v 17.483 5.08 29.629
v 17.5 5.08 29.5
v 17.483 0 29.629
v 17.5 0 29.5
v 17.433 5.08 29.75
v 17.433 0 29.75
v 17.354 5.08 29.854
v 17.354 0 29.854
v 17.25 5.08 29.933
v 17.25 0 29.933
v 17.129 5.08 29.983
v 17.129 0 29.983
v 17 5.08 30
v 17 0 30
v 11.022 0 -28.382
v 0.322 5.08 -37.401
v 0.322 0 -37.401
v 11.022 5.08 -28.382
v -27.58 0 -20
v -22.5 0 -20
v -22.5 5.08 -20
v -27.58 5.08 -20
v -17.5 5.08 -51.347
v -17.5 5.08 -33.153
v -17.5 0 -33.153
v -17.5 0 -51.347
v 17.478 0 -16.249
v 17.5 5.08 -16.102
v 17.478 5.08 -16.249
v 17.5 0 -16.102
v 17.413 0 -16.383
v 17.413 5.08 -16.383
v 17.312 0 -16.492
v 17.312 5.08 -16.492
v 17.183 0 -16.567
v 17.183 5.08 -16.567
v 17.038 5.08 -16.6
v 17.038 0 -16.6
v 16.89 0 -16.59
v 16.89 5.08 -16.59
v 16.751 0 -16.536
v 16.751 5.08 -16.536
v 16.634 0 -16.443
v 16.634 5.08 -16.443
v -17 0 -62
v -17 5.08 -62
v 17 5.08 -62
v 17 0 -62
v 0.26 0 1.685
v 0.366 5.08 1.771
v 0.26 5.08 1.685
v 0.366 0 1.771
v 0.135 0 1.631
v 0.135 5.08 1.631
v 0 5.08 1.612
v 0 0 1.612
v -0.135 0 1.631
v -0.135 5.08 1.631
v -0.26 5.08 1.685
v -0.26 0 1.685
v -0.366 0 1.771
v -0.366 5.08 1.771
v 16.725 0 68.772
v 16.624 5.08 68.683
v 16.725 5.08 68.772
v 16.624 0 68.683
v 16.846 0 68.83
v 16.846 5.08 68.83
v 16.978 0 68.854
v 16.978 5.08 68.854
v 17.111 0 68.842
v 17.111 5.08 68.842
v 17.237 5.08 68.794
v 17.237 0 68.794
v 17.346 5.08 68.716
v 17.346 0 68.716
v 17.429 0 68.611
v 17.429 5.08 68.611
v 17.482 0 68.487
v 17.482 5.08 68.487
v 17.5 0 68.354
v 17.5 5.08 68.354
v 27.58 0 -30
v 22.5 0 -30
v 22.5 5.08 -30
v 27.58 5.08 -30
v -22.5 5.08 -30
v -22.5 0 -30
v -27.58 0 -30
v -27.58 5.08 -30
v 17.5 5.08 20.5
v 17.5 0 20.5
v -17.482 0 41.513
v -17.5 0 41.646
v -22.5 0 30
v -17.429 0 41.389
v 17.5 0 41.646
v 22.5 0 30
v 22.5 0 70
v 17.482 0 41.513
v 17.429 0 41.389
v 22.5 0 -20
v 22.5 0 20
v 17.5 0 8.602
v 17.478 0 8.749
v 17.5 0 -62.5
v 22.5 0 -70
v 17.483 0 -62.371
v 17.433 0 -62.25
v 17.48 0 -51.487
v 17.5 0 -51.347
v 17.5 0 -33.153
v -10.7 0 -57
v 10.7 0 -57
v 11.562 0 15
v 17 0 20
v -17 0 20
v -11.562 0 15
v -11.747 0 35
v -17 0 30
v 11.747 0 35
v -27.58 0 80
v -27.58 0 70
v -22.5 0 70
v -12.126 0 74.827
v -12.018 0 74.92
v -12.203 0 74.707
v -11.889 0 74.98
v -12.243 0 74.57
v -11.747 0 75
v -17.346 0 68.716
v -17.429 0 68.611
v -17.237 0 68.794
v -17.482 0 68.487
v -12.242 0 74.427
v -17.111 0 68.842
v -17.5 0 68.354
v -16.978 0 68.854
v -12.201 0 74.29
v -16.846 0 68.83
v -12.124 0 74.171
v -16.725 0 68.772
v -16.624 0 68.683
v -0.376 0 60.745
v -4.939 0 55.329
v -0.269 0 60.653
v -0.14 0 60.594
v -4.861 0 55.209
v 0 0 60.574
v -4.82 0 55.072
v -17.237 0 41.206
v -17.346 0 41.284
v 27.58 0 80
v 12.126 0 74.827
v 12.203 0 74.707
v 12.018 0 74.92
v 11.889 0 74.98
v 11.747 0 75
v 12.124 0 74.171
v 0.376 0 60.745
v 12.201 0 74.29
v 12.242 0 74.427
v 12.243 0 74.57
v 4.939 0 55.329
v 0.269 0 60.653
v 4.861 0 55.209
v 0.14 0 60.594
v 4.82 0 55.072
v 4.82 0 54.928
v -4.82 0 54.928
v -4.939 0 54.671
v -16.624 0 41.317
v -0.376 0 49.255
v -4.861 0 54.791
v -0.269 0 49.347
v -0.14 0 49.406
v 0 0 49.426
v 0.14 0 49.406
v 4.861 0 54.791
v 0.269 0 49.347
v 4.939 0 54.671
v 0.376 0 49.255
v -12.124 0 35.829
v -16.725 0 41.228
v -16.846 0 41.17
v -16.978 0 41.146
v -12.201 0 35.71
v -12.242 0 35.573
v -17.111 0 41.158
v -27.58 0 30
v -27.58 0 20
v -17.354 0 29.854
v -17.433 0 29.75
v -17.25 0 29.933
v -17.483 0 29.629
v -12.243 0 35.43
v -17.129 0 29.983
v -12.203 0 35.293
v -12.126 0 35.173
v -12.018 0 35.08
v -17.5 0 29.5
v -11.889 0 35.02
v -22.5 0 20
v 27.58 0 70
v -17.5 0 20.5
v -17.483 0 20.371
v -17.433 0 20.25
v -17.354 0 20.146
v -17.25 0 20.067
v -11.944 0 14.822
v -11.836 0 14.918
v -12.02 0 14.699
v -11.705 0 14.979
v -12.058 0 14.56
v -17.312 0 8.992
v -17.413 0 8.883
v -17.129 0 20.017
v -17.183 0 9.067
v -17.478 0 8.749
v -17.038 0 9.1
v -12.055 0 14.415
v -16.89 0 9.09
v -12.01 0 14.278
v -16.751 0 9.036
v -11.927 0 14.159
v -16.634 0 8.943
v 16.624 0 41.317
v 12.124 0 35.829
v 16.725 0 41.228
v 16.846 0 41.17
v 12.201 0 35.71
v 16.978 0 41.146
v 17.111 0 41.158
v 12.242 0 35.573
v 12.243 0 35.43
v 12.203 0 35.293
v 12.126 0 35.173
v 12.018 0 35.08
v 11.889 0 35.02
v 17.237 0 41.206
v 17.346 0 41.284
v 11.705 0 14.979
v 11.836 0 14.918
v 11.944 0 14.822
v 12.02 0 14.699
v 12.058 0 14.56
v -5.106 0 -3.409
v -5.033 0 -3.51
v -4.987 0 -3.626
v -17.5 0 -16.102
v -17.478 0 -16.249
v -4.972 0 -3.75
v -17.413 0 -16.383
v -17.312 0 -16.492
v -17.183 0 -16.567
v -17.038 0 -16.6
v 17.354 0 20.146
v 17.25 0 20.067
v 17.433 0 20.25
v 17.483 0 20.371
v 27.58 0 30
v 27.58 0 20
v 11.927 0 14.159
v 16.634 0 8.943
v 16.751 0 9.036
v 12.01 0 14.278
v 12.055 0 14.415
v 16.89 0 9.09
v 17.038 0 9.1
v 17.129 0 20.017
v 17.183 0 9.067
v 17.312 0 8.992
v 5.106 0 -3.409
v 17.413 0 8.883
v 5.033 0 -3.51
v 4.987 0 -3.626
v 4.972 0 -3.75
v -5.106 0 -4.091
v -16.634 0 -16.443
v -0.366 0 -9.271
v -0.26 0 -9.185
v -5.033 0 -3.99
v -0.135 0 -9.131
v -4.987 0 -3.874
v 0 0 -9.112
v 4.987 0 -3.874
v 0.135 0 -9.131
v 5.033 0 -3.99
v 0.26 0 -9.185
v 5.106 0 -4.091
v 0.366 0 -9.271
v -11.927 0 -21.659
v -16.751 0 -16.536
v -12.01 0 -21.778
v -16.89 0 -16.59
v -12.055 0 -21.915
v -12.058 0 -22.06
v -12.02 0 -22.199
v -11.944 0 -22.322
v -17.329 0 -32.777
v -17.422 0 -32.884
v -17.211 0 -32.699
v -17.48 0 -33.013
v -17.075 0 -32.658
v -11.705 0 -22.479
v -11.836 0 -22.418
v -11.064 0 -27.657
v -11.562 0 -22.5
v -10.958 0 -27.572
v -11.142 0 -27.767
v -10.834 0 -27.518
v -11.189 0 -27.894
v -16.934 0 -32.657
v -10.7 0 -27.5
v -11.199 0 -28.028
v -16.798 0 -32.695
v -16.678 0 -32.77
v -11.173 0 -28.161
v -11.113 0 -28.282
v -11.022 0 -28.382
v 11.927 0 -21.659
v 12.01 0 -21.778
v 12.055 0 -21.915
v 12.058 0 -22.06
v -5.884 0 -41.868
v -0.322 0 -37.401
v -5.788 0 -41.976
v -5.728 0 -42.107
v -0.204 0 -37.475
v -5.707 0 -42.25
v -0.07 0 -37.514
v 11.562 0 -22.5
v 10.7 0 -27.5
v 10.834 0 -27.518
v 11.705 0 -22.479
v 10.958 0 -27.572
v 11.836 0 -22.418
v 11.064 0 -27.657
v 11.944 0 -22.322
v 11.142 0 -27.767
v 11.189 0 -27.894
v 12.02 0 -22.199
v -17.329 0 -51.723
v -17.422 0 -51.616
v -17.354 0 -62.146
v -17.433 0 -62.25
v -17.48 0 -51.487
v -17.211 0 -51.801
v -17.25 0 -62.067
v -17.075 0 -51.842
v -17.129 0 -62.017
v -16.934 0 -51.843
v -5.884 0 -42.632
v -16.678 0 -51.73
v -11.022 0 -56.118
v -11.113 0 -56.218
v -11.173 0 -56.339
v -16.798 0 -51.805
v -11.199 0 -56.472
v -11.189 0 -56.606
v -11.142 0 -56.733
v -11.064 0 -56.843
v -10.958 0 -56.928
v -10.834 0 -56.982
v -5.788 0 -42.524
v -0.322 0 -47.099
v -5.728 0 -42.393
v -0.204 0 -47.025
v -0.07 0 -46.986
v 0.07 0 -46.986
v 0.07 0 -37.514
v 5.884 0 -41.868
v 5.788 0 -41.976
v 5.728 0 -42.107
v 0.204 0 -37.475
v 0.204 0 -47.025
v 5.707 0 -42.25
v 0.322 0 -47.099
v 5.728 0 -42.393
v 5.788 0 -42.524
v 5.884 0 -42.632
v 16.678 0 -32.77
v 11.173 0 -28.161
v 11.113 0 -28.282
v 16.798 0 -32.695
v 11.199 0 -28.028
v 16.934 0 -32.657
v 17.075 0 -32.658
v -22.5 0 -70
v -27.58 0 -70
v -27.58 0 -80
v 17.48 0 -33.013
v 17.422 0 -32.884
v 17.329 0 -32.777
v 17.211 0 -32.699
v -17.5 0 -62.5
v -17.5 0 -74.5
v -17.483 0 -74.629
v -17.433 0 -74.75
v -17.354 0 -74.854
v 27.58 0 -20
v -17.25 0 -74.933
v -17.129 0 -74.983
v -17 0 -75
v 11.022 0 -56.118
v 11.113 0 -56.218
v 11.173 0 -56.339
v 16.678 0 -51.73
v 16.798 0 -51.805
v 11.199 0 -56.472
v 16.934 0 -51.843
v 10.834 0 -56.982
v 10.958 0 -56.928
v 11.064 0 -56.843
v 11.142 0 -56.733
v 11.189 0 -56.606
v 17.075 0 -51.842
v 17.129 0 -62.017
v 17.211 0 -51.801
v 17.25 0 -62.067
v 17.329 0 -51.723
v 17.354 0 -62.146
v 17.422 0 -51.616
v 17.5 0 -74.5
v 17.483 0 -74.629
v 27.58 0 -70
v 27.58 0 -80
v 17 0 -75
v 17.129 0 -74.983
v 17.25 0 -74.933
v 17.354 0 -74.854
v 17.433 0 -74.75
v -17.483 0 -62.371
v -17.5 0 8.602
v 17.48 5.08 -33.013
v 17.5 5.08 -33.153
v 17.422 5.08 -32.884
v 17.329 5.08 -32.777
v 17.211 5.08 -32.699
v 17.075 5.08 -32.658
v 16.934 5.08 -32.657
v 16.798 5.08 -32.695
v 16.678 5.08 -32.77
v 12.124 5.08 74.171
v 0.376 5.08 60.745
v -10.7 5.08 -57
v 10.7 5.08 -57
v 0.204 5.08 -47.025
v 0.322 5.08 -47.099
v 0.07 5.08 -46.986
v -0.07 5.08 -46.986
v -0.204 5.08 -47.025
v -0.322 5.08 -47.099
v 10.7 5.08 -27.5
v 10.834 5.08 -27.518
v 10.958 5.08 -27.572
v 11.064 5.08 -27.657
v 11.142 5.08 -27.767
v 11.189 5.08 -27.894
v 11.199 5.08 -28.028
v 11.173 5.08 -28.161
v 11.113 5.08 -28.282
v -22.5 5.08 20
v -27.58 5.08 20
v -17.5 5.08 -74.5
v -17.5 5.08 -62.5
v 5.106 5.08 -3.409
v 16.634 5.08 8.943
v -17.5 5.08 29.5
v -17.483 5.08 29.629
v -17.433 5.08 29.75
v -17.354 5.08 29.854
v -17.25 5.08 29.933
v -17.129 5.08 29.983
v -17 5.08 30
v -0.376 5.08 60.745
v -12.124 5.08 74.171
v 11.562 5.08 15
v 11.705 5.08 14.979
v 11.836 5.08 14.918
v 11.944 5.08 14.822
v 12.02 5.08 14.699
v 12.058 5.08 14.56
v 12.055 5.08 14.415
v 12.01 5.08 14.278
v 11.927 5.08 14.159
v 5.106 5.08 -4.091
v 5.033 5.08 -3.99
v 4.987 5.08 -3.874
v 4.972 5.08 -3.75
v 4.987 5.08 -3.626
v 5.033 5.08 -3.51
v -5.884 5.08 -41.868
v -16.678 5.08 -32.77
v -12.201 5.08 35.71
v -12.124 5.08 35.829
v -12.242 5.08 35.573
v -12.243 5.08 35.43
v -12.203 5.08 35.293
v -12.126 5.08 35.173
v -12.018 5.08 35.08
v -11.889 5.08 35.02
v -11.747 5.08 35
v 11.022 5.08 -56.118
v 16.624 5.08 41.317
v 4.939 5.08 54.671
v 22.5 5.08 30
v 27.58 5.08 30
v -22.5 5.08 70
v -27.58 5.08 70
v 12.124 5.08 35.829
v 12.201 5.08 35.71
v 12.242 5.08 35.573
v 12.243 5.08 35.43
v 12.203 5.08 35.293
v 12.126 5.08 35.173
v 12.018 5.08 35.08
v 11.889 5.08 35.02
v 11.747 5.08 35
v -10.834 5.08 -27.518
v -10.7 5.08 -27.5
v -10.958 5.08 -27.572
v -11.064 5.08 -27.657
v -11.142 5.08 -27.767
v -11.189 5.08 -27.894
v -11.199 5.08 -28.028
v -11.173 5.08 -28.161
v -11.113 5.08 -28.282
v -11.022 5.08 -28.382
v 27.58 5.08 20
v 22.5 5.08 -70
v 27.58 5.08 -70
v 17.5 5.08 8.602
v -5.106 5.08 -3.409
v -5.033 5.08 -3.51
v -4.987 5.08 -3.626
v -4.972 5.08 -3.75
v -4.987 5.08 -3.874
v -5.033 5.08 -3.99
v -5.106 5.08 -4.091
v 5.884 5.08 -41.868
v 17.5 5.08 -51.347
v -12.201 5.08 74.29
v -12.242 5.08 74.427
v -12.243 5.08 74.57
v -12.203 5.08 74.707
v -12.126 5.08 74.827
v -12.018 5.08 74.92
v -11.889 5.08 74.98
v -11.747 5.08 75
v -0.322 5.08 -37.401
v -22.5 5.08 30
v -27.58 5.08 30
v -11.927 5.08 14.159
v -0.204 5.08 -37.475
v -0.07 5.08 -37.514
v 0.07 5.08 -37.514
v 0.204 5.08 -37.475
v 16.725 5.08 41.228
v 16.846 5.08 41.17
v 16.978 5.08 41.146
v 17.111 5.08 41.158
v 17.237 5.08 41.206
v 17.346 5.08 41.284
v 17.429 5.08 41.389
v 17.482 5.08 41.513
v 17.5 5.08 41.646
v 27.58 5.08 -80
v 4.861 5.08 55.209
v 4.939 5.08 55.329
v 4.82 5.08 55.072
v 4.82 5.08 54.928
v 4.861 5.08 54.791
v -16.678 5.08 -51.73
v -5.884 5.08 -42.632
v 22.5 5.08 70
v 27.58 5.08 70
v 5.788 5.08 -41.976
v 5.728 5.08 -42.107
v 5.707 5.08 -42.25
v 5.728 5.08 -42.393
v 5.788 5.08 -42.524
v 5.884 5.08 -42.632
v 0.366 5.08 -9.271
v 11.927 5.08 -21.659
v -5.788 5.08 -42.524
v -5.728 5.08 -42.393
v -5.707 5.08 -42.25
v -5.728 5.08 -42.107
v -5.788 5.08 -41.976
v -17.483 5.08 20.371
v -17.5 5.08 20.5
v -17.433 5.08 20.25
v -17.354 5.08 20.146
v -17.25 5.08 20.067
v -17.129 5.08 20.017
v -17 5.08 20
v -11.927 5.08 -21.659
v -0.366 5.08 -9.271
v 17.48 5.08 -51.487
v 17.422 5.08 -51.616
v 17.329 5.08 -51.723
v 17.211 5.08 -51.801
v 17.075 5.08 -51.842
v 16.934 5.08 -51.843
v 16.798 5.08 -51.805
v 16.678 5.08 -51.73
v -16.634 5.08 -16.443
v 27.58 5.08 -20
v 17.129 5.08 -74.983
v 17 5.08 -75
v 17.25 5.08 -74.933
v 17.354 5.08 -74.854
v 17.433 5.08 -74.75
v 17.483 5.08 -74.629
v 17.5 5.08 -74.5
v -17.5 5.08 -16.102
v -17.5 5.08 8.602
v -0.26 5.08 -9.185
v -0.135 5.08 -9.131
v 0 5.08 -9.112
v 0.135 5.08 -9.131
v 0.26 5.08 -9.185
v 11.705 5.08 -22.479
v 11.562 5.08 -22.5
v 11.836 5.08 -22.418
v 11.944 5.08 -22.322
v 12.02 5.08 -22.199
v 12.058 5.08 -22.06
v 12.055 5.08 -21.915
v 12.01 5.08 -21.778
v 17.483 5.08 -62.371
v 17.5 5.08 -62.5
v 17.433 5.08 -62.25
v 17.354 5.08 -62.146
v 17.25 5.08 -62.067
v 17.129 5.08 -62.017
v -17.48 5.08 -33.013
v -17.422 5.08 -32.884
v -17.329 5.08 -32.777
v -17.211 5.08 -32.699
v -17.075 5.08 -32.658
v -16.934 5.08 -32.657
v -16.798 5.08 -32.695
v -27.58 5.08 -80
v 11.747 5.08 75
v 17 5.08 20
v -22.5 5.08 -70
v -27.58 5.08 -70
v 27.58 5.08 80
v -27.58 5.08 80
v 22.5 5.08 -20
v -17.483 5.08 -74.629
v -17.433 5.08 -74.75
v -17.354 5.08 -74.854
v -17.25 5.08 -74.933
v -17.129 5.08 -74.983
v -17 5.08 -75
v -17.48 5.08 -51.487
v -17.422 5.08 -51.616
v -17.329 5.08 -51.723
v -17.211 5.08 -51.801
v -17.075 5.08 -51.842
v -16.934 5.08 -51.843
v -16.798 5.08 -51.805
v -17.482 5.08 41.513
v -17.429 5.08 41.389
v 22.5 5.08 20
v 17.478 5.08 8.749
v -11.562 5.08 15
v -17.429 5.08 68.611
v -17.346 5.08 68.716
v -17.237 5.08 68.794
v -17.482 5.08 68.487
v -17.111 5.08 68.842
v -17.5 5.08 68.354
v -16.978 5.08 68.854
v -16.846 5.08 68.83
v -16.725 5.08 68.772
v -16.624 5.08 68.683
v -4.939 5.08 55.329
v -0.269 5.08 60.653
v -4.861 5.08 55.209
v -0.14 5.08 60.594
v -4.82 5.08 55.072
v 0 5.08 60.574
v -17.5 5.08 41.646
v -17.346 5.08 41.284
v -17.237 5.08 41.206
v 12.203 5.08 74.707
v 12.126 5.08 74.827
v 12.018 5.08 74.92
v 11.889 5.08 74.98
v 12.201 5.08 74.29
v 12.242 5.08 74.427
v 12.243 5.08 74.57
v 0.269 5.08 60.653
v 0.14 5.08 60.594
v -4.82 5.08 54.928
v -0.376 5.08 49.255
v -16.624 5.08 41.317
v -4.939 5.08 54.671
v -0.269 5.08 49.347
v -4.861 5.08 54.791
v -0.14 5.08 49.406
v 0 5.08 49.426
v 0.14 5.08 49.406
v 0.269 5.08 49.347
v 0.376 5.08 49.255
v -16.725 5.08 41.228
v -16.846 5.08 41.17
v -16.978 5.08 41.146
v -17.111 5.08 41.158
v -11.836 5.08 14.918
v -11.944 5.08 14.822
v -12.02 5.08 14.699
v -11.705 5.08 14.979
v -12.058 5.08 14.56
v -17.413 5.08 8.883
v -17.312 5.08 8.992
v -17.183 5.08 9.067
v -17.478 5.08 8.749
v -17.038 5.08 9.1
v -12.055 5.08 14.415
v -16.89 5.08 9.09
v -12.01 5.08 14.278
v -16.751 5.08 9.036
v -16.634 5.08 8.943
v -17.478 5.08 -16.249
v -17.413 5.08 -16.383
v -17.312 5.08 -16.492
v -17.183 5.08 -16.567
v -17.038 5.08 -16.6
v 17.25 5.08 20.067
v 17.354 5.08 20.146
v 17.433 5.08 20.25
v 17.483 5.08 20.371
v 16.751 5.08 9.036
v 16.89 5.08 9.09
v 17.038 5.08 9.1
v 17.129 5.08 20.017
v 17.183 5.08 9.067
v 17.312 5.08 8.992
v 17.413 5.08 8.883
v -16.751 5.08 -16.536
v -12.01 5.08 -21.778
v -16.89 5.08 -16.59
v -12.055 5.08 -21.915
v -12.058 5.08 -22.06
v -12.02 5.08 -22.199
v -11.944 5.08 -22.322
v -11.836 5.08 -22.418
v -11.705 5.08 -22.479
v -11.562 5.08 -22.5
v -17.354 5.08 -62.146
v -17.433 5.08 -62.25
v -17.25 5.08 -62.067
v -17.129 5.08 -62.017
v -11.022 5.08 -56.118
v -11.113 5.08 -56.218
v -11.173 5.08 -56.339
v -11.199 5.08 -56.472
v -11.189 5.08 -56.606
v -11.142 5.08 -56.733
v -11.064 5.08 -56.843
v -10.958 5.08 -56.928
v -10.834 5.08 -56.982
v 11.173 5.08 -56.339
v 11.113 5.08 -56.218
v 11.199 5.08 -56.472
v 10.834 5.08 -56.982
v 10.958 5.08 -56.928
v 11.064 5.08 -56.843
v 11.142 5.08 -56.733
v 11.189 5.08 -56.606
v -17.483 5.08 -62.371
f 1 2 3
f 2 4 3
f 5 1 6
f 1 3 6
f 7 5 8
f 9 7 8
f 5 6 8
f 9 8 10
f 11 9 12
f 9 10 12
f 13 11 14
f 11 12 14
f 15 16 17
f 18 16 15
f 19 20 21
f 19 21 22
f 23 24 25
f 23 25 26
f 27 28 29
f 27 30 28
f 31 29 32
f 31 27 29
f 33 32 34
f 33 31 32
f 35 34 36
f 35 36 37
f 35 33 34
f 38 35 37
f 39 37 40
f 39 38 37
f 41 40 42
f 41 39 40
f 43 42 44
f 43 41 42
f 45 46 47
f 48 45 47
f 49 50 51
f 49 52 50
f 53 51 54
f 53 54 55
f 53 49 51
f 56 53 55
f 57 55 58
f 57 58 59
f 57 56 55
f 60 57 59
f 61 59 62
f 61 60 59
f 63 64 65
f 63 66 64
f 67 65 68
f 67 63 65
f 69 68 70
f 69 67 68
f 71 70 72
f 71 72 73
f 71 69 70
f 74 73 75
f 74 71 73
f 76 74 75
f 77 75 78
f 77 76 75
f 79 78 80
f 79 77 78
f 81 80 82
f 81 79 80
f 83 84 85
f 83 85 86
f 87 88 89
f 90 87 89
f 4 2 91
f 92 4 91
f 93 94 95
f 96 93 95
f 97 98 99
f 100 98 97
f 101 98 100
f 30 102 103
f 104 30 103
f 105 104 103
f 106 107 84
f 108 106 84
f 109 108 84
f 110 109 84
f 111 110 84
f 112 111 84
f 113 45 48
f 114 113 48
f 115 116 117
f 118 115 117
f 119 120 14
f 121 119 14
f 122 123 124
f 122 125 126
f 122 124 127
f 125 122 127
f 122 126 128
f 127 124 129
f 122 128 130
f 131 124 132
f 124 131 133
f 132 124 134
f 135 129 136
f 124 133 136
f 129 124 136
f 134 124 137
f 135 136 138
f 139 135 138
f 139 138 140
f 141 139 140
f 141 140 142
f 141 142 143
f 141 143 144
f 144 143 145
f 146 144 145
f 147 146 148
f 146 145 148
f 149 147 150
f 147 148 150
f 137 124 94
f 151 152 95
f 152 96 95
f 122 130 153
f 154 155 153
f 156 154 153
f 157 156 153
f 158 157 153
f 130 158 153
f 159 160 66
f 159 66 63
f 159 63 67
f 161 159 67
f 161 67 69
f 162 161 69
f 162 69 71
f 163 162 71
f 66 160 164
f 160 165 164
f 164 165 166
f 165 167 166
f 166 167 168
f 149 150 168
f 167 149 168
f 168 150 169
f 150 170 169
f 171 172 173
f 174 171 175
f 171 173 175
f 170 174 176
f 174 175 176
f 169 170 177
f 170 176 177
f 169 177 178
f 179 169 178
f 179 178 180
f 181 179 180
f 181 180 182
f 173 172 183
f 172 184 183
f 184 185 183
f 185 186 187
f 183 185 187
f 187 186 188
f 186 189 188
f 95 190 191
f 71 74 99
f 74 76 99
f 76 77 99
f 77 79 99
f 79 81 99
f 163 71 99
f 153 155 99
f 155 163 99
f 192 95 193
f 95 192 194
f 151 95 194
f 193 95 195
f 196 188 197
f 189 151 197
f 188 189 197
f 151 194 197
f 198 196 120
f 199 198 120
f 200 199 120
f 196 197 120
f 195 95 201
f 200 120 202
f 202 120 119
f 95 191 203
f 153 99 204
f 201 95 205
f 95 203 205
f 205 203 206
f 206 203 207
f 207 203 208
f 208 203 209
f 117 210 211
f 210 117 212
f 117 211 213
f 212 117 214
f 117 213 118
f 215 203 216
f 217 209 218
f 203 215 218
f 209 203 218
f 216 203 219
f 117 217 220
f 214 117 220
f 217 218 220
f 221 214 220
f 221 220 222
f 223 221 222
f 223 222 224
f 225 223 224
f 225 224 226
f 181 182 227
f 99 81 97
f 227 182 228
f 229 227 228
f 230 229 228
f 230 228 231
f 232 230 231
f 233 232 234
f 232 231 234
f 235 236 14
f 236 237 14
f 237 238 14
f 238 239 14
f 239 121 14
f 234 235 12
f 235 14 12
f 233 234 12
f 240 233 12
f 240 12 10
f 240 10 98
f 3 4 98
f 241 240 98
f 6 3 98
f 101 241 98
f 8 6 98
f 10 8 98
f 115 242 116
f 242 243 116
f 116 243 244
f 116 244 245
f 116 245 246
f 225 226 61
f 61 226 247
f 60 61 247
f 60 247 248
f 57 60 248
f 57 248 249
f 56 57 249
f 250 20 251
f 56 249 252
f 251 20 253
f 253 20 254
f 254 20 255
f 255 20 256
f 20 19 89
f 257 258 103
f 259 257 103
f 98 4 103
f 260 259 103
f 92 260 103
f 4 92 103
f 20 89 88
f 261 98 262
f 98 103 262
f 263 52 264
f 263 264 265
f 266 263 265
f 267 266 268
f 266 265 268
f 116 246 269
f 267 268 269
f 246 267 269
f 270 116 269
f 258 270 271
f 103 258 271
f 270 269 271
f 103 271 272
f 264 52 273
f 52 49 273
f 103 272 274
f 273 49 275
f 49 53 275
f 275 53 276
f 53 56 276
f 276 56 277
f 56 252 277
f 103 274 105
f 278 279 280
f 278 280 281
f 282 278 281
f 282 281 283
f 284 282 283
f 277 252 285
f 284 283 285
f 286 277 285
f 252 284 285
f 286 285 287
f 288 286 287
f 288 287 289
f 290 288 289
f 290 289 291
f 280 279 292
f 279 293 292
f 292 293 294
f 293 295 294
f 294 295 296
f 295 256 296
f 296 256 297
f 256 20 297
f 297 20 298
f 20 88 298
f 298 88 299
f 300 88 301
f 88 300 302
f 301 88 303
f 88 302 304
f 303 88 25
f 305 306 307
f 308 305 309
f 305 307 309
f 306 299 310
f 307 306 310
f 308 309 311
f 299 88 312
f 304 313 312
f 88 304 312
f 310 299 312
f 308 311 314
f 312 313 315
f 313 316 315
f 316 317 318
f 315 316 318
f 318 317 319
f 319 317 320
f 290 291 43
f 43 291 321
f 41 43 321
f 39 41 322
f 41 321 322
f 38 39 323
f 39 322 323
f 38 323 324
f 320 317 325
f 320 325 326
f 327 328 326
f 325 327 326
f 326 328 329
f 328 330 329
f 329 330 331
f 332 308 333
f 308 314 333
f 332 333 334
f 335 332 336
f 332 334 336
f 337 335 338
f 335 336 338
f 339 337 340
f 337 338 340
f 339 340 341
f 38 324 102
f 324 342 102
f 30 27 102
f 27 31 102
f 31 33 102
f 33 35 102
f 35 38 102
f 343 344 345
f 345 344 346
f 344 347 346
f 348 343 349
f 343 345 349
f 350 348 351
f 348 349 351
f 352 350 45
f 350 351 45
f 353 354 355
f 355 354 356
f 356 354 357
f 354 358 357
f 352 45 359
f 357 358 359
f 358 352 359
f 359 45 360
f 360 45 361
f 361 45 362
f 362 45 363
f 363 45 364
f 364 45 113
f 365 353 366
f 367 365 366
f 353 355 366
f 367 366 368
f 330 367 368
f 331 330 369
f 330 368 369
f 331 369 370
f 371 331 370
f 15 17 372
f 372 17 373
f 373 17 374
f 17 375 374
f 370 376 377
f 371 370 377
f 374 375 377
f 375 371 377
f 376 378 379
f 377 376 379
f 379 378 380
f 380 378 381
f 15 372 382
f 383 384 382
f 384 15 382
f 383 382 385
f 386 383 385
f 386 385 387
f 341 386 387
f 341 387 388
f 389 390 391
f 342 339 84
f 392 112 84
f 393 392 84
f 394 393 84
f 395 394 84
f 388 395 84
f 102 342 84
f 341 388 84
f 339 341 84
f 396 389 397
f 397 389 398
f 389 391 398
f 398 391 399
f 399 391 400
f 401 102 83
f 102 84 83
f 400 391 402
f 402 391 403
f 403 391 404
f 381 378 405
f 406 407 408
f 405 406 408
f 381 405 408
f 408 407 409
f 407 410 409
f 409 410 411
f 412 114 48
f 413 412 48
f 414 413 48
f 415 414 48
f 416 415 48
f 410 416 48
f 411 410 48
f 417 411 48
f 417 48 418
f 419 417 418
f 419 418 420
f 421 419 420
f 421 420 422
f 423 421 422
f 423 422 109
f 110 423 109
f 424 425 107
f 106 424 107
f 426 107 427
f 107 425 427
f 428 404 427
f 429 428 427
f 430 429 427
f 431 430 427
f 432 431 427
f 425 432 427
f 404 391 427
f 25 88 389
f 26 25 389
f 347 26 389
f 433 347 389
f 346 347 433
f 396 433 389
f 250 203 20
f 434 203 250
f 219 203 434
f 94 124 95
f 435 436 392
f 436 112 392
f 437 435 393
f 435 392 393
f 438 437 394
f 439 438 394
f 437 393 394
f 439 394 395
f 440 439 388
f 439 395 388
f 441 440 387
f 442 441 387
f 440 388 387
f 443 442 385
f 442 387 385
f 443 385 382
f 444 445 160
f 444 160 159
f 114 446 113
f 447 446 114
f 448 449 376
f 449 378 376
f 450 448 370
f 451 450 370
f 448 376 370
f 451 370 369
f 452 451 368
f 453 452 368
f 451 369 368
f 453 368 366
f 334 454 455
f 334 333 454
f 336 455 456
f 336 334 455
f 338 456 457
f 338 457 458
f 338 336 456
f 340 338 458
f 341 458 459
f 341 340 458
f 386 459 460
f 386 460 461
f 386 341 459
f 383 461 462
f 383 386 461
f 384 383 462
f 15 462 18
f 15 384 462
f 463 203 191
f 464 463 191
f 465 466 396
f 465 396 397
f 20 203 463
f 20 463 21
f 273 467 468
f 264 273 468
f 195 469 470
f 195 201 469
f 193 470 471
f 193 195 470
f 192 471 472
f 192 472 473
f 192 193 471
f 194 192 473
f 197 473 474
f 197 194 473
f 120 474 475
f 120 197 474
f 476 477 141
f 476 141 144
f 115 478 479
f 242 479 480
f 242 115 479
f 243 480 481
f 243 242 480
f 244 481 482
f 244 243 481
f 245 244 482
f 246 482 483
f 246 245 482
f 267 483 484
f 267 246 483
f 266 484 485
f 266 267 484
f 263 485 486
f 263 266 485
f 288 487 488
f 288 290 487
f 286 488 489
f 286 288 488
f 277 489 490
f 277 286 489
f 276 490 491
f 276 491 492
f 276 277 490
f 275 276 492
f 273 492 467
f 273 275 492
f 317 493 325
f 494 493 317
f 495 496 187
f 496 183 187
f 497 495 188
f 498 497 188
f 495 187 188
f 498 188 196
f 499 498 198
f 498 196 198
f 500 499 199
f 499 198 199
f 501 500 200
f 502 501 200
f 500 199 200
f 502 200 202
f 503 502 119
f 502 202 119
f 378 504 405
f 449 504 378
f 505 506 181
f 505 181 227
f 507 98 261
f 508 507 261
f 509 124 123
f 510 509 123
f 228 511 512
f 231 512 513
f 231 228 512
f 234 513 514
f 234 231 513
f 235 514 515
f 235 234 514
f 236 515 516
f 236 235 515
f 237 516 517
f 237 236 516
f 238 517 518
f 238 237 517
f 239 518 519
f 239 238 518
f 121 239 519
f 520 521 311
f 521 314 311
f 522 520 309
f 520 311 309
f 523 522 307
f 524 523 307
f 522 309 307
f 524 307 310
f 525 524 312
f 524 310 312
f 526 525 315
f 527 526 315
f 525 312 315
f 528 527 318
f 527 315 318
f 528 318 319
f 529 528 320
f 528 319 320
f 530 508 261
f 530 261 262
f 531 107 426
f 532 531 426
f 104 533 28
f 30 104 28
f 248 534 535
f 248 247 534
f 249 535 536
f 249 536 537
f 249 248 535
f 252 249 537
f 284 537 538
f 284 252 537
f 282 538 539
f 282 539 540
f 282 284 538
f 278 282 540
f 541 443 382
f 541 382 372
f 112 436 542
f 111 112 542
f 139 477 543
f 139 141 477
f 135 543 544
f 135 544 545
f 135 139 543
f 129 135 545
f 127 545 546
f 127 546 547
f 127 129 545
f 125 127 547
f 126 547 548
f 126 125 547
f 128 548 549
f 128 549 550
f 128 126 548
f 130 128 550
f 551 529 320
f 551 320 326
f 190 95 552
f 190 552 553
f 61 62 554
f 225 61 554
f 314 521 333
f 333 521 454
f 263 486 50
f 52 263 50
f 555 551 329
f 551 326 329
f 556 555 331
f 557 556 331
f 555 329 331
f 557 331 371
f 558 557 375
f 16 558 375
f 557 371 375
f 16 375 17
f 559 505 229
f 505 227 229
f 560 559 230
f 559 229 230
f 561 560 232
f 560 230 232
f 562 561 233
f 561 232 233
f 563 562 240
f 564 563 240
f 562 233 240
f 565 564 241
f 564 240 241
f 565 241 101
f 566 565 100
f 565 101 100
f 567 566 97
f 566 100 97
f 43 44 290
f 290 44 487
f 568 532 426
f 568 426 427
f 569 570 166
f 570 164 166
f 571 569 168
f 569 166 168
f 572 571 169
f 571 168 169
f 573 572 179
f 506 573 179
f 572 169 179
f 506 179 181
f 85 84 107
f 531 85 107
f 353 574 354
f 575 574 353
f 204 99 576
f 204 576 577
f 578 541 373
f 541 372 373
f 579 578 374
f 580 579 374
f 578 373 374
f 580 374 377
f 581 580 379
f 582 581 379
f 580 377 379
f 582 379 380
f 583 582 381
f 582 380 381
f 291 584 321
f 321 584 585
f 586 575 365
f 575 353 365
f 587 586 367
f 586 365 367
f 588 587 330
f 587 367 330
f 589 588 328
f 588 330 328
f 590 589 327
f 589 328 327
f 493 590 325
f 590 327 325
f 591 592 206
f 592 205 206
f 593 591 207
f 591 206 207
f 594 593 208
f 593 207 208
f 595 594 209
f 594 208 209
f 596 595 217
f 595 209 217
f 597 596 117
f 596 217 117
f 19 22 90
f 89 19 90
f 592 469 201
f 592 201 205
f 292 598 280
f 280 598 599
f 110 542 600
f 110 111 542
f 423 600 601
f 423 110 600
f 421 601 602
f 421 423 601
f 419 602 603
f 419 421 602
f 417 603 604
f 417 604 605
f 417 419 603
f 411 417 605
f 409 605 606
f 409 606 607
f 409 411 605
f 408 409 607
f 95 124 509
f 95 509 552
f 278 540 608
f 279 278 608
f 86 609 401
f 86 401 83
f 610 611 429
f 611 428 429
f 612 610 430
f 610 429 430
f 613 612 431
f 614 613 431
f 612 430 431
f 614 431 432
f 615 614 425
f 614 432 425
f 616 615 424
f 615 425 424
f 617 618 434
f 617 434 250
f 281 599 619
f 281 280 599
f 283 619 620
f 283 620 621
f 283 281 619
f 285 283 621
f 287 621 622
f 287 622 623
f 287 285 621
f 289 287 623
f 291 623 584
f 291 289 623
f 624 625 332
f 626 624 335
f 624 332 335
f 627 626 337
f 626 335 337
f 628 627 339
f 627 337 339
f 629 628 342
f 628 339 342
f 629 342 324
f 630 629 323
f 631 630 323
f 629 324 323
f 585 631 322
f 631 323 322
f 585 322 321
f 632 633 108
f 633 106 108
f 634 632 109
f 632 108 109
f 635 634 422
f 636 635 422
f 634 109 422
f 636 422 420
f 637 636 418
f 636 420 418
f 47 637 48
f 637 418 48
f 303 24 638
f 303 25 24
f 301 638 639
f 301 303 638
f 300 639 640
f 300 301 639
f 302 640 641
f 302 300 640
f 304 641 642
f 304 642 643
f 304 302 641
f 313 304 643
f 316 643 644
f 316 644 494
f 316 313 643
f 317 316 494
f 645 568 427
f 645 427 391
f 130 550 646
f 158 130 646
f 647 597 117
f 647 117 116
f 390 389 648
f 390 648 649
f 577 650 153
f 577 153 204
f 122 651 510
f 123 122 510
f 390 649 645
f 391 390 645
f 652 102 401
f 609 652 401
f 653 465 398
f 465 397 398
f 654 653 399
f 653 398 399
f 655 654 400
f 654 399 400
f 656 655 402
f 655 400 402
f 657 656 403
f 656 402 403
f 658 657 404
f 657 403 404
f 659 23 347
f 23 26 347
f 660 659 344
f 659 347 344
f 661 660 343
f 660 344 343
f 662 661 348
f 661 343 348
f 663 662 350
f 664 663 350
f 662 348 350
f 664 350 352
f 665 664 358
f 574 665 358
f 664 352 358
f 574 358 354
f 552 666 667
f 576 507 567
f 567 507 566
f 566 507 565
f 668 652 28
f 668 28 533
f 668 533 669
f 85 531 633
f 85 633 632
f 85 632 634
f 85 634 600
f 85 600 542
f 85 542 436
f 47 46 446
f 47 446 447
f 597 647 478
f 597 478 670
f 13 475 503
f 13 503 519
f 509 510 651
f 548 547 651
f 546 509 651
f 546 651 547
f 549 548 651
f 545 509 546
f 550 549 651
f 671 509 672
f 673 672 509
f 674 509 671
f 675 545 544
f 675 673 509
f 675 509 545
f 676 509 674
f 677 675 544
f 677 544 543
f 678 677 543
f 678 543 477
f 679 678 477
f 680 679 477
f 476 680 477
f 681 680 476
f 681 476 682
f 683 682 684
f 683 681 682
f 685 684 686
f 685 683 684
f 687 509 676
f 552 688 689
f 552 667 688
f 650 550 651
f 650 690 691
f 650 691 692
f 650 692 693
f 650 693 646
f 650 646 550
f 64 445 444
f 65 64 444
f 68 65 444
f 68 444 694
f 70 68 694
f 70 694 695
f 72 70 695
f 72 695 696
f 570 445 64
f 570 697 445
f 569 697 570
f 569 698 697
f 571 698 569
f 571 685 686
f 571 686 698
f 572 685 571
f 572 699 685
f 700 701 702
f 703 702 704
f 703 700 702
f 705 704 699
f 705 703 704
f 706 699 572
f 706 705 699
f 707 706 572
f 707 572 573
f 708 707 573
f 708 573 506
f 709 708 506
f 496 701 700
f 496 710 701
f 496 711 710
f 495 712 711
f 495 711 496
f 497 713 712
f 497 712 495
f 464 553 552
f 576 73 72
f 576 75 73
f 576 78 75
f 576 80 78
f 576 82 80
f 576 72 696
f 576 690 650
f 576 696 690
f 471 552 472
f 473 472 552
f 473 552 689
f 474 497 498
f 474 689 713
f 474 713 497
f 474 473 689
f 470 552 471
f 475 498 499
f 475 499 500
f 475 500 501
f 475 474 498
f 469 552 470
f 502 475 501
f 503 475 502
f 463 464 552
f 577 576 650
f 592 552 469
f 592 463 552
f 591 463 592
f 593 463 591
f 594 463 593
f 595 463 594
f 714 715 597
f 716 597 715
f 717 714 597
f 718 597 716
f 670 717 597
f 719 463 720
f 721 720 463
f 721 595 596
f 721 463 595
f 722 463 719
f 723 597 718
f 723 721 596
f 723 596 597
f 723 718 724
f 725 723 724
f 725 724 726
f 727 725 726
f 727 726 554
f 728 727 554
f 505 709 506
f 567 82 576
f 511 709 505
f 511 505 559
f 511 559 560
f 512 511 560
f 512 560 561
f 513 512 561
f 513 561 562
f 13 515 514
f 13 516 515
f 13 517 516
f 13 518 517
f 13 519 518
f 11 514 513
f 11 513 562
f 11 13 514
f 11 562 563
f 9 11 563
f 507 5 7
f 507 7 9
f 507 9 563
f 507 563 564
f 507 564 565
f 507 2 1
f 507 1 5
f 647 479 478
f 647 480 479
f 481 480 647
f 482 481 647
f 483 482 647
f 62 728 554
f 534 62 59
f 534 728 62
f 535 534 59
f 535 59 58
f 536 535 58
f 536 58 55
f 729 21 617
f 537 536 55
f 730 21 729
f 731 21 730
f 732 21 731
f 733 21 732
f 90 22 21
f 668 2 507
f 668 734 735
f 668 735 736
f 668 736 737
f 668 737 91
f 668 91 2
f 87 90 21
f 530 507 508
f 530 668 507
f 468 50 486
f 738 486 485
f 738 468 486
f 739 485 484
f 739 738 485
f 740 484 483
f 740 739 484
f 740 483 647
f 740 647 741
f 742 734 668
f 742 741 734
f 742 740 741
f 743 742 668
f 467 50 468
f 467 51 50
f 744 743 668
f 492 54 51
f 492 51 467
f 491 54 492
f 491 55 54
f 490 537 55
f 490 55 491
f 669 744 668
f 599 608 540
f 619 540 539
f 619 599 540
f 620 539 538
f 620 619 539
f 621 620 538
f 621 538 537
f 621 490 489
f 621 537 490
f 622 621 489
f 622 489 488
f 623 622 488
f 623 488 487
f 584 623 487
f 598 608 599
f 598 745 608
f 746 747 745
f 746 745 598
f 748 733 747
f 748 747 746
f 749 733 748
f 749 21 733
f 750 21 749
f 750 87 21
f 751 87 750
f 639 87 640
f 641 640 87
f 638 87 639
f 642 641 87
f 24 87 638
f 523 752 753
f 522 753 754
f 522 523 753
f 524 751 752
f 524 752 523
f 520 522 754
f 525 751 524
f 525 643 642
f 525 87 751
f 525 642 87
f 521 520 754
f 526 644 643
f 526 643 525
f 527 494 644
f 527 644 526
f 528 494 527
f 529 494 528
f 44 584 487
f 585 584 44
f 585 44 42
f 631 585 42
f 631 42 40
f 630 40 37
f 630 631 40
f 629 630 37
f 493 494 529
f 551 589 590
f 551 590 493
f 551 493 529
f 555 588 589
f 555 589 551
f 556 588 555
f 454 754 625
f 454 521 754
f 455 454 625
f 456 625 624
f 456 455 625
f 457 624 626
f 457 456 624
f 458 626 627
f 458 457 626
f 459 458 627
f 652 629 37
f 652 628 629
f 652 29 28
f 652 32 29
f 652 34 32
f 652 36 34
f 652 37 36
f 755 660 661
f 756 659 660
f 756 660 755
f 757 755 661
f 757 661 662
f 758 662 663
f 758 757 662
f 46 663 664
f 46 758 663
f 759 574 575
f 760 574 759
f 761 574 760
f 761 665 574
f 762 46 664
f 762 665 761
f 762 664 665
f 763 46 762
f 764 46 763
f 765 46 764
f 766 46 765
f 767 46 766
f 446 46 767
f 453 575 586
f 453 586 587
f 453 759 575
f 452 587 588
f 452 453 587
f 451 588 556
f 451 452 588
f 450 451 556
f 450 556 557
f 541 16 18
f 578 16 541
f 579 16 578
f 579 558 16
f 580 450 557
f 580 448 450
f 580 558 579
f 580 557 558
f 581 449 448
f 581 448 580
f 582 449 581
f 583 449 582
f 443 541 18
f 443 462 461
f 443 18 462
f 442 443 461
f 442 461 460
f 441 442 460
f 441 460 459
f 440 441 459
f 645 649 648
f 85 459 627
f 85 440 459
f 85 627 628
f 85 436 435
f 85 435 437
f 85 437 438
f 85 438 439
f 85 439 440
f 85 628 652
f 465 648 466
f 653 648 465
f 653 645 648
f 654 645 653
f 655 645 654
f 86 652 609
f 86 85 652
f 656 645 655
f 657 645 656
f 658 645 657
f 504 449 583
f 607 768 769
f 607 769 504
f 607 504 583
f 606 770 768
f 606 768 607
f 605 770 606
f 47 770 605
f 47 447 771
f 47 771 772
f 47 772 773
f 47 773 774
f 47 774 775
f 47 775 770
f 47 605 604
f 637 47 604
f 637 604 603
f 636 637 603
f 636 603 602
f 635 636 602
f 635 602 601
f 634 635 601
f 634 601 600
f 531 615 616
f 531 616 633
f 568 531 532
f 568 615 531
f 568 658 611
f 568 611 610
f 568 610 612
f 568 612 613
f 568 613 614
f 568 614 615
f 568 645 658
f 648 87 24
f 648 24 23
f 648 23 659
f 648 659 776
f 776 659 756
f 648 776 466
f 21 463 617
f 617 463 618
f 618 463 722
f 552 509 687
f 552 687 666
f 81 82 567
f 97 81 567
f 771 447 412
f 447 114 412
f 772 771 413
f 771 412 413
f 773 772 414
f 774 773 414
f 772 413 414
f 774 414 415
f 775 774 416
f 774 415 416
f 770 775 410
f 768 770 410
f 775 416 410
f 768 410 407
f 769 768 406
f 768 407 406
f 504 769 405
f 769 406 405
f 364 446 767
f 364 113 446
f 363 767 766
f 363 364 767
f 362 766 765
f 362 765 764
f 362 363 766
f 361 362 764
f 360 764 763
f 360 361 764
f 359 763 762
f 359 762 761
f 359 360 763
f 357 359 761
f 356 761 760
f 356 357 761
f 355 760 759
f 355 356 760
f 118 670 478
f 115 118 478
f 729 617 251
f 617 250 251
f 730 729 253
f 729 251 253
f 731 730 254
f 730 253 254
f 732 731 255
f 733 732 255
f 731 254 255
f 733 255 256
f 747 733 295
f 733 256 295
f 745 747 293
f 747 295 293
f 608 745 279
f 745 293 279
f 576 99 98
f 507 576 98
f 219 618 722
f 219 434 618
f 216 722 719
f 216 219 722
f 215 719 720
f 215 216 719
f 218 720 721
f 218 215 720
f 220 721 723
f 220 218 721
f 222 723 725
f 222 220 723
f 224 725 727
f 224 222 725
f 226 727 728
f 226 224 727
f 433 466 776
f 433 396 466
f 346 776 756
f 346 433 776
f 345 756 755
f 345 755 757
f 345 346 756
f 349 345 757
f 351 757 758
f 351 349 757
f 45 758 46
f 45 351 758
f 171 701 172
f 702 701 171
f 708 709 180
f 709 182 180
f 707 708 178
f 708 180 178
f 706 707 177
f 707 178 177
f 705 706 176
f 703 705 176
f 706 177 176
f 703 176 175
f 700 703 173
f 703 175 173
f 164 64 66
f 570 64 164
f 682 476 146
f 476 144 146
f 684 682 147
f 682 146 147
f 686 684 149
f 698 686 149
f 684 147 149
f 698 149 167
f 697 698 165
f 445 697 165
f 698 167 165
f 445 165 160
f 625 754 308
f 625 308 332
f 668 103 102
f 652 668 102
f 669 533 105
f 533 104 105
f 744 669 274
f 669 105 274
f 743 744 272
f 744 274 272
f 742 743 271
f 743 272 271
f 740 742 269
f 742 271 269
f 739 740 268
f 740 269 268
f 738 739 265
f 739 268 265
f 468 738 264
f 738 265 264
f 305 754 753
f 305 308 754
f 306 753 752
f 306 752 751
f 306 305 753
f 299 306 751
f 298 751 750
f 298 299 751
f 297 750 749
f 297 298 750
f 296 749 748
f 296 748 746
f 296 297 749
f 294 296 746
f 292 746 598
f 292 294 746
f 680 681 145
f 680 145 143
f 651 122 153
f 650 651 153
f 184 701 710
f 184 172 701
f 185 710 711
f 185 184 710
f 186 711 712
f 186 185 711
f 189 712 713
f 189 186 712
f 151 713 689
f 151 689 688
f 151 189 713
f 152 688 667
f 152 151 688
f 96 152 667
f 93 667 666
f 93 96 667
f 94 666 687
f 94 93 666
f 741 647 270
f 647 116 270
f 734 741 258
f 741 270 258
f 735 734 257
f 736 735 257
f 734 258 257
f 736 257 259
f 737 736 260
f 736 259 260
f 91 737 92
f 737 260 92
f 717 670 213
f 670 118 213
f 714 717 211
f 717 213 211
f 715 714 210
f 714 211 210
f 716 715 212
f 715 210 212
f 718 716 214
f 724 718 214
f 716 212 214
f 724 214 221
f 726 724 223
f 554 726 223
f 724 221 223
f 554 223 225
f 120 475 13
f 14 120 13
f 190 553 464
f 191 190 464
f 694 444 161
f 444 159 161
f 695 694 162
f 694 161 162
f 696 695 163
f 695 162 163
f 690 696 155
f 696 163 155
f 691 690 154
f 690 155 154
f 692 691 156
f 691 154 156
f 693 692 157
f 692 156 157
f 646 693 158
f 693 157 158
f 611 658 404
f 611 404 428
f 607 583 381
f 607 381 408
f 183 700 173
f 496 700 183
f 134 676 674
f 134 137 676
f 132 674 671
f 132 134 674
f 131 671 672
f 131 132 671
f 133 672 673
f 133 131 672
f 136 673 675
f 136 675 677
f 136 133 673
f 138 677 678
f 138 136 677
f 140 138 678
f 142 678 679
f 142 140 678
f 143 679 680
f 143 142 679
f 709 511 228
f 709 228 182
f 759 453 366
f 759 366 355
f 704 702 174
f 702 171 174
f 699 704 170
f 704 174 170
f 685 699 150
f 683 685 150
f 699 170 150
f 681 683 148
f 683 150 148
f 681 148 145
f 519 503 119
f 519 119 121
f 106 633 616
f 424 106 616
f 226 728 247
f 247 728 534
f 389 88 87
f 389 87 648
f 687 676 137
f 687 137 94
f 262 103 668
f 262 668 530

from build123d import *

# Parameters (mm, degrees)
SKETCH1_W           = 45
SKETCH1_H           = 160
BOSS_EXTRUDE1_DEPTH = 5.08
SKETCH2_W           = 5.08
SKETCH2_H           = 10
BOSS_EXTRUDE2_DEPTH = 5.08
SKETCH3_W           = 35
SKETCH3_H           = 13
SKETCH3_H_2         = 29.5
SKETCH3_H_3         = 37.5
SKETCH3_H_4         = 10
SKETCH3_H_5         = 40
CUT_EXTRUDE1_DEPTH  = 6.08
BOSS_EXTRUDE3_DEPTH = 5.08
FILLET1_R           = 0.5


with BuildPart() as part:
    # Sketch1 → Boss-Extrude1 (new body)
    with BuildSketch(Plane(origin=(0, 0, 0), x_dir=(1, 0, 0), z_dir=(0, 1, 0))):
        Rectangle(SKETCH1_W, SKETCH1_H)
    extrude(amount=BOSS_EXTRUDE1_DEPTH)

    # Sketch2 → Boss-Extrude2 (add)
    with BuildSketch(Plane(origin=(0, 5.08, 0), x_dir=(1, 0, 0), z_dir=(0, 1, 0))):
        with Locations((25.04, 25)):
            Rectangle(SKETCH2_W, SKETCH2_H)
        with Locations((25.04, 75)):
            Rectangle(SKETCH2_W, SKETCH2_H)
        with Locations((25.04, -25)):
            Rectangle(SKETCH2_W, SKETCH2_H)
        with Locations((25.04, -75)):
            Rectangle(SKETCH2_W, SKETCH2_H)
    boss_extrude2 = extrude(amount=-BOSS_EXTRUDE2_DEPTH)

    # Mirror1: Boss-Extrude2 across plane
    add(boss_extrude2.mirror(Plane(origin=(0, 0, 0), x_dir=(0, 0, 1), z_dir=(1, 0, 0))))

    # Sketch3 → Cut-Extrude1 (cut, through all)
    with BuildSketch(Plane(origin=(0, 5.08, 0), x_dir=(1, 0, 0), z_dir=(0, 1, 0))):
        with Locations((0, 68.5)):
            Rectangle(SKETCH3_W, SKETCH3_H)
        with Locations((0, 42.25)):
            Rectangle(SKETCH3_W, SKETCH3_H_2)
        with Locations((0, 3.75)):
            Rectangle(SKETCH3_W, SKETCH3_H_3)
        with Locations((0, -25)):
            Rectangle(SKETCH3_W, SKETCH3_H_4)
        with Locations((0, -55)):
            Rectangle(SKETCH3_W, SKETCH3_H_5)
    extrude(amount=-CUT_EXTRUDE1_DEPTH, mode=Mode.SUBTRACT)

    # Sketch4 → Boss-Extrude3 (add)
    with BuildSketch(Plane(origin=(0, 5.08, 0), x_dir=(1, 0, 0), z_dir=(0, 1, 0))):
        Polygon((-17.5, -40.315072906), (-4.650688793, -55), (-17.5, -69.684927094), (-17.5, -75), (-12.849311207, -75), (0, -60.315072906), (12.849311207, -75), (17.5, -75), (17.5, -69.684927094), (4.650688793, -55), (17.5, -40.315072906), (17.5, -35), (12.849311207, -35), (0, -49.684927094), (-12.849311207, -35), (-17.5, -35), align=None)
        Polygon((-12.712400277, 22.5), (0, 8.879571132), (12.712400277, 22.5), (17.5, 22.5), (17.5, 17.370428868), (4.787599723, 3.75), (17.5, -9.870428868), (17.5, -15), (12.712400277, -15), (0, -1.379571132), (-12.712400277, -15), (-17.5, -15), (-17.5, -9.870428868), (-4.787599723, 3.75), (-17.5, 17.370428868), (-17.5, 22.5), align=None)
        Polygon((-17.5, 52.422609914), (-5.430801797, 42.25), (-17.5, 32.077390086), (-17.5, 27.5), (-12.069198203, 27.5), (0, 37.672609914), (12.069198203, 27.5), (17.5, 27.5), (17.5, 32.077390086), (5.430801797, 42.25), (17.5, 52.422609914), (17.5, 57), (12.069198203, 57), (0, 46.827390086), (-12.069198203, 57), (-17.5, 57), align=None)
    extrude(amount=-BOSS_EXTRUDE3_DEPTH)

    # Fillet1
    fillet1_edges = [part.edges().sort_by_distance(p)[0] for p in [
        (-17.5, 2.54, -62),
        (-17.5, 2.54, -75),
        (17.5, 2.54, -75),
        (17.5, 2.54, -62),
        (-17.5, 2.54, 30),
        (-17.5, 2.54, 20),
        (17.5, 2.54, 20),
        (17.5, 2.54, 30),
        (-12.849311207, 2.54, 75),
        (-17.5, 2.54, 69.684927094),
        (-4.650688793, 2.54, 55),
        (-17.5, 2.54, 40.315072906),
        (-12.849311207, 2.54, 35),
        (0, 2.54, 49.684927094),
        (12.849311207, 2.54, 35),
        (17.5, 2.54, 40.315072906),
        (4.650688793, 2.54, 55),
        (17.5, 2.54, 69.684927094),
        (12.849311207, 2.54, 75),
        (0, 2.54, 60.315072906),
        (-17.5, 2.54, 9.870428868),
        (-4.787599723, 2.54, -3.75),
        (-17.5, 2.54, -17.370428868),
        (-12.712400277, 2.54, -22.5),
        (0, 2.54, -8.879571132),
        (12.712400277, 2.54, -22.5),
        (17.5, 2.54, -17.370428868),
        (4.787599723, 2.54, -3.75),
        (17.5, 2.54, 9.870428868),
        (12.712400277, 2.54, 15),
        (0, 2.54, 1.379571132),
        (-12.712400277, 2.54, 15),
        (-12.069198203, 2.54, -27.5),
        (-17.5, 2.54, -32.077390086),
        (-5.430801797, 2.54, -42.25),
        (-17.5, 2.54, -52.422609914),
        (-12.069198203, 2.54, -57),
        (0, 2.54, -46.827390086),
        (12.069198203, 2.54, -57),
        (17.5, 2.54, -52.422609914),
        (5.430801797, 2.54, -42.25),
        (17.5, 2.54, -32.077390086),
        (12.069198203, 2.54, -27.5),
        (0, 2.54, -37.672609914),
    ]]
    fillet(fillet1_edges, radius=FILLET1_R)


solid = part.part
